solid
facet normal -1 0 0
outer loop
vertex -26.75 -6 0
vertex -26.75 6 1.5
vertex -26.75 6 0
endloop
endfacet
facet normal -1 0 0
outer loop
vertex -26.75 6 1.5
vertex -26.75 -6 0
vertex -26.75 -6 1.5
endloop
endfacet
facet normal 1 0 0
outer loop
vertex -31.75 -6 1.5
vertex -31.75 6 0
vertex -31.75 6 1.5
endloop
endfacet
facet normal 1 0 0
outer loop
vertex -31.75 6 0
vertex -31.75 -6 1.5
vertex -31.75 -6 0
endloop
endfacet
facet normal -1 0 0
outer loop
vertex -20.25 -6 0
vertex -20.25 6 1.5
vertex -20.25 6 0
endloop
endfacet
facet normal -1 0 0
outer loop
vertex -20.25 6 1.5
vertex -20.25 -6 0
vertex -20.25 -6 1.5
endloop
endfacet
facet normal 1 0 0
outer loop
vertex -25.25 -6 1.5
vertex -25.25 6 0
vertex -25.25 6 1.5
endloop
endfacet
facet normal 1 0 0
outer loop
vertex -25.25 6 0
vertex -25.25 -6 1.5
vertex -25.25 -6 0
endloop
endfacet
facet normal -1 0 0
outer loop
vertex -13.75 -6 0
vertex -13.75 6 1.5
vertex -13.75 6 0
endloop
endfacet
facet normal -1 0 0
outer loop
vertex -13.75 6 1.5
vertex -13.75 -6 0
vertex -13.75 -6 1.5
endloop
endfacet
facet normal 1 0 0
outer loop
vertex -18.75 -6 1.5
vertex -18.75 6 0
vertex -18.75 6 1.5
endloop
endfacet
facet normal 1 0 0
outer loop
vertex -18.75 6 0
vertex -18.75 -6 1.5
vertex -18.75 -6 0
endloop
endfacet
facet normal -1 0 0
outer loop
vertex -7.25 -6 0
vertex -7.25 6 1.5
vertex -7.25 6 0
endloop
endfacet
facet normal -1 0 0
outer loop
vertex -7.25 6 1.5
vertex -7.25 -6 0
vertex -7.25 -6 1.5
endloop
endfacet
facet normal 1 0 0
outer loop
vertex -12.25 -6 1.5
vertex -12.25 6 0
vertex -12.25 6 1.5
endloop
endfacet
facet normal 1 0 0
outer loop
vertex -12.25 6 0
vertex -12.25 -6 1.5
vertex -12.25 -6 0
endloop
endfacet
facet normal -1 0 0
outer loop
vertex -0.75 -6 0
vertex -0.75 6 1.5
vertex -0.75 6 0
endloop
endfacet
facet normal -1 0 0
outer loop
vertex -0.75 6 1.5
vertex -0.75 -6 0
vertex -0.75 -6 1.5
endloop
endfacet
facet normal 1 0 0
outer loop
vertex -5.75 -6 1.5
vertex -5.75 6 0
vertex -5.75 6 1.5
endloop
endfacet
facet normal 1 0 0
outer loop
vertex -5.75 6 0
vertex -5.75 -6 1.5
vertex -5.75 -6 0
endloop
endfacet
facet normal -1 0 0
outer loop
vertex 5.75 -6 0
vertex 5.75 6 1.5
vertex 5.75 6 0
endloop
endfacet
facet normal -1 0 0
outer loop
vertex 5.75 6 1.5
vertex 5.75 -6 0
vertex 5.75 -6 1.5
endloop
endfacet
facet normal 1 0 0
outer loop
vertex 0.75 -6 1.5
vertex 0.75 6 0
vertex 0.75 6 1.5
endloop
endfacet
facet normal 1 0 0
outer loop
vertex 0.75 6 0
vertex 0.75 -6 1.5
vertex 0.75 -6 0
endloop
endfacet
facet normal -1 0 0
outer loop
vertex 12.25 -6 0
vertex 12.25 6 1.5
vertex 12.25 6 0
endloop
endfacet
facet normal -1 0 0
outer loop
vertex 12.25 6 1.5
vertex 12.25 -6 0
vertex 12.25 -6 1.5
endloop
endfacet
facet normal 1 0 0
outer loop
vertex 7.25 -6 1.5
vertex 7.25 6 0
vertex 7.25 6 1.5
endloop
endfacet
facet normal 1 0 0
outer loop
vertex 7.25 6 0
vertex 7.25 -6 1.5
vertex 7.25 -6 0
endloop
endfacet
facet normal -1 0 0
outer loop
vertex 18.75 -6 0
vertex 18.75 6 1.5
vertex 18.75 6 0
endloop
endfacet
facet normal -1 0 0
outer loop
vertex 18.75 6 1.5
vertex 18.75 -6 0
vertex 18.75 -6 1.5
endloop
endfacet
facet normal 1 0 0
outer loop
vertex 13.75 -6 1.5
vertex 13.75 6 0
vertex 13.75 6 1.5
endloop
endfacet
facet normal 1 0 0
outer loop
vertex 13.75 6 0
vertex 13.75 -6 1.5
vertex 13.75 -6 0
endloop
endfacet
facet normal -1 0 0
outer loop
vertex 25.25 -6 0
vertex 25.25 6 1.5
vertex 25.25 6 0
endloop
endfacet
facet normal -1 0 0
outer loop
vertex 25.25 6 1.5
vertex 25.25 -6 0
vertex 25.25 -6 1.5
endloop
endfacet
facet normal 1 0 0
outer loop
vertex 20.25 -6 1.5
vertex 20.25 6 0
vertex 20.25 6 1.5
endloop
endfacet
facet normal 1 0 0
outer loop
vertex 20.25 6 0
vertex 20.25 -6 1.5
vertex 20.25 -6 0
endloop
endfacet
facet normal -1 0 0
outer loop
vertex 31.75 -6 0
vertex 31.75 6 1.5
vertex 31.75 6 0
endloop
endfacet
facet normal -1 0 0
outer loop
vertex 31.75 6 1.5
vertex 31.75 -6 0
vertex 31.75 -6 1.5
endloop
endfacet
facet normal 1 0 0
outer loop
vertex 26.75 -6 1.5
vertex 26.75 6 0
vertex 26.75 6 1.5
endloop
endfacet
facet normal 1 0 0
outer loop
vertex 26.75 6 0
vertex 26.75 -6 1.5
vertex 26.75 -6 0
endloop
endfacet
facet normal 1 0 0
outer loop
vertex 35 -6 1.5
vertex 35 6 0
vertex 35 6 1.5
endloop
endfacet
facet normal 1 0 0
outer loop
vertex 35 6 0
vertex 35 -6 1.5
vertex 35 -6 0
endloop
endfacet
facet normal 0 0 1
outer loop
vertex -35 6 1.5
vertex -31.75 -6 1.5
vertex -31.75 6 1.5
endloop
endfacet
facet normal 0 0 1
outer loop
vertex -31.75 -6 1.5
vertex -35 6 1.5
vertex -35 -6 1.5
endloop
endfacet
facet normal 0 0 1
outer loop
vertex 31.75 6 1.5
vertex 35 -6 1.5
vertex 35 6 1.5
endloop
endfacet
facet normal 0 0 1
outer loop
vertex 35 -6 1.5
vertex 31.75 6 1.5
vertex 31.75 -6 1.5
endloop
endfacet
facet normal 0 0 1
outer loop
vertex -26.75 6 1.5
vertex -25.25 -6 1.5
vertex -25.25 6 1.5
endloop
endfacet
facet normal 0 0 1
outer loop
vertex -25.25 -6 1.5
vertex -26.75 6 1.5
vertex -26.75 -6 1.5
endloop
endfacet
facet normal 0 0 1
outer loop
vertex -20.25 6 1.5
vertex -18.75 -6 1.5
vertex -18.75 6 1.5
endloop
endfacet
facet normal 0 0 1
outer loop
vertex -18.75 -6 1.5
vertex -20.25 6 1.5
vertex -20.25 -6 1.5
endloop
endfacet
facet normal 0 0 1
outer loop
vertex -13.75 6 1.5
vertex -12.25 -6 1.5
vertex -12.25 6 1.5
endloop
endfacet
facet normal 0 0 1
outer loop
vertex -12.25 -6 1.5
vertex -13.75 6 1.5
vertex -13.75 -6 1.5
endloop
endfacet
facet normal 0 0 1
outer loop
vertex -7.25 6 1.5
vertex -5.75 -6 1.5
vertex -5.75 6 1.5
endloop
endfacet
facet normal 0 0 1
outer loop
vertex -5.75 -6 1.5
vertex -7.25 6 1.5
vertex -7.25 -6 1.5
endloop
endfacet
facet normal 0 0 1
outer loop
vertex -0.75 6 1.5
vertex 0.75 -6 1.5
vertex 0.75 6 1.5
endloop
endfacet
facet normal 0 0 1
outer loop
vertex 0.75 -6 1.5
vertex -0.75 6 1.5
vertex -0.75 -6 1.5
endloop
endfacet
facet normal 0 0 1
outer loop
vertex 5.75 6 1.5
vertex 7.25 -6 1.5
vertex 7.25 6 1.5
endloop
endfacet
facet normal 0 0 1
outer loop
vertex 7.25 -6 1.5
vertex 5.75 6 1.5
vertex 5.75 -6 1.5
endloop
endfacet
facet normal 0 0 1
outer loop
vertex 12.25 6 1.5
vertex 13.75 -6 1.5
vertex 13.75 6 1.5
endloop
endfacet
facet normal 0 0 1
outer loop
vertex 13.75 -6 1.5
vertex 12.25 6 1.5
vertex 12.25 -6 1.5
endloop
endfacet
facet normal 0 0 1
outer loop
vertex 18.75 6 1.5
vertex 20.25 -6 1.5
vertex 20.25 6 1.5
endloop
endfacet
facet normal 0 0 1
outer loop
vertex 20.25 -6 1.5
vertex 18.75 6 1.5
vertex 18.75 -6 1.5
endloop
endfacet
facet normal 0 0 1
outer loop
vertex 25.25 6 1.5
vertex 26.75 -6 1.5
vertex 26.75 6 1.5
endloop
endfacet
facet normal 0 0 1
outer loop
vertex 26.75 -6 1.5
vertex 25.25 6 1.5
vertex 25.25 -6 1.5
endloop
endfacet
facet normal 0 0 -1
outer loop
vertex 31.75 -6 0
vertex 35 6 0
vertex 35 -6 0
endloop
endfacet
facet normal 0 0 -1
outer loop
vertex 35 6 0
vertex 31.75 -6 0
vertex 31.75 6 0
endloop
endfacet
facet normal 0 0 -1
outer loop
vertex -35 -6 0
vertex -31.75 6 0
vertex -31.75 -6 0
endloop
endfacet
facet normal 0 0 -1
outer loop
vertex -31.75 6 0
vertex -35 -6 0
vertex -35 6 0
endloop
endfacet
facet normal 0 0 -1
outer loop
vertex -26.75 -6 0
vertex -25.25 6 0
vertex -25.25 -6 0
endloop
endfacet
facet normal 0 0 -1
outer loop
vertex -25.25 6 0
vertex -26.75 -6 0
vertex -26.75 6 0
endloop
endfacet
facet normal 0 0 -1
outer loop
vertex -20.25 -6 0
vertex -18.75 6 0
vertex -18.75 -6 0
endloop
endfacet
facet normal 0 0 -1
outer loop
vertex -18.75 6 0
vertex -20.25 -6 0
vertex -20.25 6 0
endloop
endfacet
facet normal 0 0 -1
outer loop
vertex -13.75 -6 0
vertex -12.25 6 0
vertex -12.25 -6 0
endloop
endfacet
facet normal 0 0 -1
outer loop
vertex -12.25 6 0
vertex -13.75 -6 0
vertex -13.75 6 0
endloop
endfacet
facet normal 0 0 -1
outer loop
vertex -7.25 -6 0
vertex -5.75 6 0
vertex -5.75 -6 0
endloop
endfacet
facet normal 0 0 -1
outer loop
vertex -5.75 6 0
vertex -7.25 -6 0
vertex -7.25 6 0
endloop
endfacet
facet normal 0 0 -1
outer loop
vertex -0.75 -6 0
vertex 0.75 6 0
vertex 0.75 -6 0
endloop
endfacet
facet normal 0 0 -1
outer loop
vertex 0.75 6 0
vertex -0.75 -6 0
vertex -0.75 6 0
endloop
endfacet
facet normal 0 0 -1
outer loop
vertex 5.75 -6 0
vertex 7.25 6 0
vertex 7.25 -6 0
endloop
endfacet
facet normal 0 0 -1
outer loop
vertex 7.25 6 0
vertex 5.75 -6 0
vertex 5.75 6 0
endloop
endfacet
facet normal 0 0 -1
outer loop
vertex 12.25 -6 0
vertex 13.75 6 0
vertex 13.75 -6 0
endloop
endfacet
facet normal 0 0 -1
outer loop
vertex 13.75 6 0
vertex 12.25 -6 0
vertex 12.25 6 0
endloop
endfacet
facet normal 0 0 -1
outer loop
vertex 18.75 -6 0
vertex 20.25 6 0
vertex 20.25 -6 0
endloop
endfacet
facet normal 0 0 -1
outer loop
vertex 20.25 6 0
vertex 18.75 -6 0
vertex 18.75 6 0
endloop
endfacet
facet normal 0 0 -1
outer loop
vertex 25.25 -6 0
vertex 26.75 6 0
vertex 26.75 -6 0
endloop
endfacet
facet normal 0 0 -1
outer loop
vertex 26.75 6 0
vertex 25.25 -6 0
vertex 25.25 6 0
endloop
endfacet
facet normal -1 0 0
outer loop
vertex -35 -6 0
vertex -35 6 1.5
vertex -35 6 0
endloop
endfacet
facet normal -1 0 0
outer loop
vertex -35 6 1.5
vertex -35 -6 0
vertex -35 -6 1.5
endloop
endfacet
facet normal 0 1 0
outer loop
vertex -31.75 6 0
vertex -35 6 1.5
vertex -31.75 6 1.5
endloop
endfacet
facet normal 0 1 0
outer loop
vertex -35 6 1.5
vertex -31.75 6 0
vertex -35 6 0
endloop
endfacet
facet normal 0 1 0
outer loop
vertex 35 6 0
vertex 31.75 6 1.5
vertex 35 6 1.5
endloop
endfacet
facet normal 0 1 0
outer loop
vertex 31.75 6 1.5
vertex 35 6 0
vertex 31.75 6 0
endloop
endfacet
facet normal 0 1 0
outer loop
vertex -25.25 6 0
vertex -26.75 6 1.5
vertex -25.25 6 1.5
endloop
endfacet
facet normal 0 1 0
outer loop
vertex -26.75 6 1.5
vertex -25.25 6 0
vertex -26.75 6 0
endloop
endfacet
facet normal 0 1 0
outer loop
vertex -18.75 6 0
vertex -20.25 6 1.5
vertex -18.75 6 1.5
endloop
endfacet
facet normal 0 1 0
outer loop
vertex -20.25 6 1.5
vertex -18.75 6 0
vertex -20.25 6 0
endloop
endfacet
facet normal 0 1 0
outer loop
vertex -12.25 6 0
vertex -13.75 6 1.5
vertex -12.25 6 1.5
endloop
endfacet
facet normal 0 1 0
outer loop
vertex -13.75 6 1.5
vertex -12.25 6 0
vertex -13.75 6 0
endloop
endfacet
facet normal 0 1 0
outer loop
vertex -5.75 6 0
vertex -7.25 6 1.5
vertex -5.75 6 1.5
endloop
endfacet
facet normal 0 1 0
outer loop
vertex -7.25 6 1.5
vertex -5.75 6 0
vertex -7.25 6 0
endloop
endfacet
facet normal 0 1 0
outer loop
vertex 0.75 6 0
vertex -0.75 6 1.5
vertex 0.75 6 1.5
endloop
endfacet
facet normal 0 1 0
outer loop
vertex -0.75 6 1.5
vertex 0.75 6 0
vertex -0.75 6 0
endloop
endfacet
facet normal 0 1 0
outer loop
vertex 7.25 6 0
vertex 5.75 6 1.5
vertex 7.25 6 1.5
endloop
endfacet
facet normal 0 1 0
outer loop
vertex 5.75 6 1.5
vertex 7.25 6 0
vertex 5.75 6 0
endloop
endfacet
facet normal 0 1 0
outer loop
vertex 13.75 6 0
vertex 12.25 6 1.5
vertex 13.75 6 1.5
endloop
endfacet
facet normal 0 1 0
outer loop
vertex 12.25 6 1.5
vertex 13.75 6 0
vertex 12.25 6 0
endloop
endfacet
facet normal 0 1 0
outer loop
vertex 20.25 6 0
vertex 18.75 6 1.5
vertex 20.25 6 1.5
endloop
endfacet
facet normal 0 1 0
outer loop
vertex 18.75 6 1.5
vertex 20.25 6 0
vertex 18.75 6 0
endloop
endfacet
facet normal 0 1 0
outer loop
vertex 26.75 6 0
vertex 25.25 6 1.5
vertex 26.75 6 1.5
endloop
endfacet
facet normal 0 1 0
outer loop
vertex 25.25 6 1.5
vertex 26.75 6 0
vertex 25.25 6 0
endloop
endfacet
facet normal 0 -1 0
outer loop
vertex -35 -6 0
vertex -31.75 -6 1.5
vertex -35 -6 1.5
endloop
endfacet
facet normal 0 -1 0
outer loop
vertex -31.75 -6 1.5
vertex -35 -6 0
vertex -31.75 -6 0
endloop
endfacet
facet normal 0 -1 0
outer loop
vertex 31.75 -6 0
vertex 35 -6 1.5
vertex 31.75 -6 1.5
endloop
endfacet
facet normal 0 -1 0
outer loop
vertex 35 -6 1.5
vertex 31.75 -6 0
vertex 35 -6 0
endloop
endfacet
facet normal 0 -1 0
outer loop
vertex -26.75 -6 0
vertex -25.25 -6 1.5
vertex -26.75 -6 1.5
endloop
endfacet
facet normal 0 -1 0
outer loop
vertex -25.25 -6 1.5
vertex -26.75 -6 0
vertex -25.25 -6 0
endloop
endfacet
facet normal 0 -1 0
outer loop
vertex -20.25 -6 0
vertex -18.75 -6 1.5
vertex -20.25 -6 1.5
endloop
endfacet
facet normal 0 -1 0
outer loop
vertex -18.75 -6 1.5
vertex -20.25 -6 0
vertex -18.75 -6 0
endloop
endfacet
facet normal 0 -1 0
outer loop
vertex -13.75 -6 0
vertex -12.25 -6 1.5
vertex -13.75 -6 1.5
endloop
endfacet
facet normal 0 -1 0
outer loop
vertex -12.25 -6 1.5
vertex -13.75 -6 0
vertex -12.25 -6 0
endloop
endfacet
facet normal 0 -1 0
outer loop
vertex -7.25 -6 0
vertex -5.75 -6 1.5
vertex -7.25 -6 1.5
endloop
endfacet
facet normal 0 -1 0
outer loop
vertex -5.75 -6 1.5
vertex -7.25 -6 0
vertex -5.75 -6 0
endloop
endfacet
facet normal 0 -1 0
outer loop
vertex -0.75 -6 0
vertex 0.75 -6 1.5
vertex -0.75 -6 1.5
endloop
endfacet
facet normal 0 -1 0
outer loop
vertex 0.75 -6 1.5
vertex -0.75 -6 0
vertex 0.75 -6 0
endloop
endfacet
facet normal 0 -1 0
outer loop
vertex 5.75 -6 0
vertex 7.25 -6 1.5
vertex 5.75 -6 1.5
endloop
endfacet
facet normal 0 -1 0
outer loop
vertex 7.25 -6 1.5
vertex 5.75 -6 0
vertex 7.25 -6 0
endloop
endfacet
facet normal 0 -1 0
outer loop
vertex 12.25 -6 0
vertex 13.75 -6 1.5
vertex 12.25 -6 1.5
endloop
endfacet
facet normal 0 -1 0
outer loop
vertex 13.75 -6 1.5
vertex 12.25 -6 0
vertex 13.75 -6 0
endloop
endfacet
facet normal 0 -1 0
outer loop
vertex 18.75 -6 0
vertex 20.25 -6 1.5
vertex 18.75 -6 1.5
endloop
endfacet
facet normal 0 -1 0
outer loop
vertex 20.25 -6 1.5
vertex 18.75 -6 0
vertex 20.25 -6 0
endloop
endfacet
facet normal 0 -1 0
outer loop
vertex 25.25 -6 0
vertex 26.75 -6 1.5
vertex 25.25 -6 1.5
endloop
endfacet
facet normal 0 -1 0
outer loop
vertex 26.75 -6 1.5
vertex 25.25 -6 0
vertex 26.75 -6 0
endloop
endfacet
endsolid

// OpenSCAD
// 10-well agarose gel comb
// Print orientation: flat on bed, teeth pointing down (-Y)

$fn = 64;

// ---- Dimensions (mm) ----
plate_t      = 1.5;   // plate thickness (Z)
spine_len    = 70;    // spine length (X)
spine_w      = 12;    // spine width (Y)
tooth_w      = 5.0;   // tooth width (X)
tooth_len    = 12;    // tooth length (Y)
tooth_count  = 10;    // number of teeth
gap          = 1.5;   // gap between teeth (X)
eps          = 0.5;   // cutter overshoot past faces

// ---- Derived ----
pitch   = tooth_w + gap;            // centre-to-centre spacing
x_start = -(tooth_count - 1) * pitch / 2;  // first tooth centre (row centred)

difference() {
    // Base plate
    translate([-spine_len / 2, -spine_w / 2, 0])
        cube([spine_len, spine_w, plate_t]);

    // Teeth cut out from the plate
    for (i = [0 : tooth_count - 1])
        translate([x_start + i * pitch - tooth_w / 2,
                   -tooth_len / 2 - eps,
                   -eps])
            cube([tooth_w, tooth_len + 2 * eps, plate_t + 2 * eps]);
}
